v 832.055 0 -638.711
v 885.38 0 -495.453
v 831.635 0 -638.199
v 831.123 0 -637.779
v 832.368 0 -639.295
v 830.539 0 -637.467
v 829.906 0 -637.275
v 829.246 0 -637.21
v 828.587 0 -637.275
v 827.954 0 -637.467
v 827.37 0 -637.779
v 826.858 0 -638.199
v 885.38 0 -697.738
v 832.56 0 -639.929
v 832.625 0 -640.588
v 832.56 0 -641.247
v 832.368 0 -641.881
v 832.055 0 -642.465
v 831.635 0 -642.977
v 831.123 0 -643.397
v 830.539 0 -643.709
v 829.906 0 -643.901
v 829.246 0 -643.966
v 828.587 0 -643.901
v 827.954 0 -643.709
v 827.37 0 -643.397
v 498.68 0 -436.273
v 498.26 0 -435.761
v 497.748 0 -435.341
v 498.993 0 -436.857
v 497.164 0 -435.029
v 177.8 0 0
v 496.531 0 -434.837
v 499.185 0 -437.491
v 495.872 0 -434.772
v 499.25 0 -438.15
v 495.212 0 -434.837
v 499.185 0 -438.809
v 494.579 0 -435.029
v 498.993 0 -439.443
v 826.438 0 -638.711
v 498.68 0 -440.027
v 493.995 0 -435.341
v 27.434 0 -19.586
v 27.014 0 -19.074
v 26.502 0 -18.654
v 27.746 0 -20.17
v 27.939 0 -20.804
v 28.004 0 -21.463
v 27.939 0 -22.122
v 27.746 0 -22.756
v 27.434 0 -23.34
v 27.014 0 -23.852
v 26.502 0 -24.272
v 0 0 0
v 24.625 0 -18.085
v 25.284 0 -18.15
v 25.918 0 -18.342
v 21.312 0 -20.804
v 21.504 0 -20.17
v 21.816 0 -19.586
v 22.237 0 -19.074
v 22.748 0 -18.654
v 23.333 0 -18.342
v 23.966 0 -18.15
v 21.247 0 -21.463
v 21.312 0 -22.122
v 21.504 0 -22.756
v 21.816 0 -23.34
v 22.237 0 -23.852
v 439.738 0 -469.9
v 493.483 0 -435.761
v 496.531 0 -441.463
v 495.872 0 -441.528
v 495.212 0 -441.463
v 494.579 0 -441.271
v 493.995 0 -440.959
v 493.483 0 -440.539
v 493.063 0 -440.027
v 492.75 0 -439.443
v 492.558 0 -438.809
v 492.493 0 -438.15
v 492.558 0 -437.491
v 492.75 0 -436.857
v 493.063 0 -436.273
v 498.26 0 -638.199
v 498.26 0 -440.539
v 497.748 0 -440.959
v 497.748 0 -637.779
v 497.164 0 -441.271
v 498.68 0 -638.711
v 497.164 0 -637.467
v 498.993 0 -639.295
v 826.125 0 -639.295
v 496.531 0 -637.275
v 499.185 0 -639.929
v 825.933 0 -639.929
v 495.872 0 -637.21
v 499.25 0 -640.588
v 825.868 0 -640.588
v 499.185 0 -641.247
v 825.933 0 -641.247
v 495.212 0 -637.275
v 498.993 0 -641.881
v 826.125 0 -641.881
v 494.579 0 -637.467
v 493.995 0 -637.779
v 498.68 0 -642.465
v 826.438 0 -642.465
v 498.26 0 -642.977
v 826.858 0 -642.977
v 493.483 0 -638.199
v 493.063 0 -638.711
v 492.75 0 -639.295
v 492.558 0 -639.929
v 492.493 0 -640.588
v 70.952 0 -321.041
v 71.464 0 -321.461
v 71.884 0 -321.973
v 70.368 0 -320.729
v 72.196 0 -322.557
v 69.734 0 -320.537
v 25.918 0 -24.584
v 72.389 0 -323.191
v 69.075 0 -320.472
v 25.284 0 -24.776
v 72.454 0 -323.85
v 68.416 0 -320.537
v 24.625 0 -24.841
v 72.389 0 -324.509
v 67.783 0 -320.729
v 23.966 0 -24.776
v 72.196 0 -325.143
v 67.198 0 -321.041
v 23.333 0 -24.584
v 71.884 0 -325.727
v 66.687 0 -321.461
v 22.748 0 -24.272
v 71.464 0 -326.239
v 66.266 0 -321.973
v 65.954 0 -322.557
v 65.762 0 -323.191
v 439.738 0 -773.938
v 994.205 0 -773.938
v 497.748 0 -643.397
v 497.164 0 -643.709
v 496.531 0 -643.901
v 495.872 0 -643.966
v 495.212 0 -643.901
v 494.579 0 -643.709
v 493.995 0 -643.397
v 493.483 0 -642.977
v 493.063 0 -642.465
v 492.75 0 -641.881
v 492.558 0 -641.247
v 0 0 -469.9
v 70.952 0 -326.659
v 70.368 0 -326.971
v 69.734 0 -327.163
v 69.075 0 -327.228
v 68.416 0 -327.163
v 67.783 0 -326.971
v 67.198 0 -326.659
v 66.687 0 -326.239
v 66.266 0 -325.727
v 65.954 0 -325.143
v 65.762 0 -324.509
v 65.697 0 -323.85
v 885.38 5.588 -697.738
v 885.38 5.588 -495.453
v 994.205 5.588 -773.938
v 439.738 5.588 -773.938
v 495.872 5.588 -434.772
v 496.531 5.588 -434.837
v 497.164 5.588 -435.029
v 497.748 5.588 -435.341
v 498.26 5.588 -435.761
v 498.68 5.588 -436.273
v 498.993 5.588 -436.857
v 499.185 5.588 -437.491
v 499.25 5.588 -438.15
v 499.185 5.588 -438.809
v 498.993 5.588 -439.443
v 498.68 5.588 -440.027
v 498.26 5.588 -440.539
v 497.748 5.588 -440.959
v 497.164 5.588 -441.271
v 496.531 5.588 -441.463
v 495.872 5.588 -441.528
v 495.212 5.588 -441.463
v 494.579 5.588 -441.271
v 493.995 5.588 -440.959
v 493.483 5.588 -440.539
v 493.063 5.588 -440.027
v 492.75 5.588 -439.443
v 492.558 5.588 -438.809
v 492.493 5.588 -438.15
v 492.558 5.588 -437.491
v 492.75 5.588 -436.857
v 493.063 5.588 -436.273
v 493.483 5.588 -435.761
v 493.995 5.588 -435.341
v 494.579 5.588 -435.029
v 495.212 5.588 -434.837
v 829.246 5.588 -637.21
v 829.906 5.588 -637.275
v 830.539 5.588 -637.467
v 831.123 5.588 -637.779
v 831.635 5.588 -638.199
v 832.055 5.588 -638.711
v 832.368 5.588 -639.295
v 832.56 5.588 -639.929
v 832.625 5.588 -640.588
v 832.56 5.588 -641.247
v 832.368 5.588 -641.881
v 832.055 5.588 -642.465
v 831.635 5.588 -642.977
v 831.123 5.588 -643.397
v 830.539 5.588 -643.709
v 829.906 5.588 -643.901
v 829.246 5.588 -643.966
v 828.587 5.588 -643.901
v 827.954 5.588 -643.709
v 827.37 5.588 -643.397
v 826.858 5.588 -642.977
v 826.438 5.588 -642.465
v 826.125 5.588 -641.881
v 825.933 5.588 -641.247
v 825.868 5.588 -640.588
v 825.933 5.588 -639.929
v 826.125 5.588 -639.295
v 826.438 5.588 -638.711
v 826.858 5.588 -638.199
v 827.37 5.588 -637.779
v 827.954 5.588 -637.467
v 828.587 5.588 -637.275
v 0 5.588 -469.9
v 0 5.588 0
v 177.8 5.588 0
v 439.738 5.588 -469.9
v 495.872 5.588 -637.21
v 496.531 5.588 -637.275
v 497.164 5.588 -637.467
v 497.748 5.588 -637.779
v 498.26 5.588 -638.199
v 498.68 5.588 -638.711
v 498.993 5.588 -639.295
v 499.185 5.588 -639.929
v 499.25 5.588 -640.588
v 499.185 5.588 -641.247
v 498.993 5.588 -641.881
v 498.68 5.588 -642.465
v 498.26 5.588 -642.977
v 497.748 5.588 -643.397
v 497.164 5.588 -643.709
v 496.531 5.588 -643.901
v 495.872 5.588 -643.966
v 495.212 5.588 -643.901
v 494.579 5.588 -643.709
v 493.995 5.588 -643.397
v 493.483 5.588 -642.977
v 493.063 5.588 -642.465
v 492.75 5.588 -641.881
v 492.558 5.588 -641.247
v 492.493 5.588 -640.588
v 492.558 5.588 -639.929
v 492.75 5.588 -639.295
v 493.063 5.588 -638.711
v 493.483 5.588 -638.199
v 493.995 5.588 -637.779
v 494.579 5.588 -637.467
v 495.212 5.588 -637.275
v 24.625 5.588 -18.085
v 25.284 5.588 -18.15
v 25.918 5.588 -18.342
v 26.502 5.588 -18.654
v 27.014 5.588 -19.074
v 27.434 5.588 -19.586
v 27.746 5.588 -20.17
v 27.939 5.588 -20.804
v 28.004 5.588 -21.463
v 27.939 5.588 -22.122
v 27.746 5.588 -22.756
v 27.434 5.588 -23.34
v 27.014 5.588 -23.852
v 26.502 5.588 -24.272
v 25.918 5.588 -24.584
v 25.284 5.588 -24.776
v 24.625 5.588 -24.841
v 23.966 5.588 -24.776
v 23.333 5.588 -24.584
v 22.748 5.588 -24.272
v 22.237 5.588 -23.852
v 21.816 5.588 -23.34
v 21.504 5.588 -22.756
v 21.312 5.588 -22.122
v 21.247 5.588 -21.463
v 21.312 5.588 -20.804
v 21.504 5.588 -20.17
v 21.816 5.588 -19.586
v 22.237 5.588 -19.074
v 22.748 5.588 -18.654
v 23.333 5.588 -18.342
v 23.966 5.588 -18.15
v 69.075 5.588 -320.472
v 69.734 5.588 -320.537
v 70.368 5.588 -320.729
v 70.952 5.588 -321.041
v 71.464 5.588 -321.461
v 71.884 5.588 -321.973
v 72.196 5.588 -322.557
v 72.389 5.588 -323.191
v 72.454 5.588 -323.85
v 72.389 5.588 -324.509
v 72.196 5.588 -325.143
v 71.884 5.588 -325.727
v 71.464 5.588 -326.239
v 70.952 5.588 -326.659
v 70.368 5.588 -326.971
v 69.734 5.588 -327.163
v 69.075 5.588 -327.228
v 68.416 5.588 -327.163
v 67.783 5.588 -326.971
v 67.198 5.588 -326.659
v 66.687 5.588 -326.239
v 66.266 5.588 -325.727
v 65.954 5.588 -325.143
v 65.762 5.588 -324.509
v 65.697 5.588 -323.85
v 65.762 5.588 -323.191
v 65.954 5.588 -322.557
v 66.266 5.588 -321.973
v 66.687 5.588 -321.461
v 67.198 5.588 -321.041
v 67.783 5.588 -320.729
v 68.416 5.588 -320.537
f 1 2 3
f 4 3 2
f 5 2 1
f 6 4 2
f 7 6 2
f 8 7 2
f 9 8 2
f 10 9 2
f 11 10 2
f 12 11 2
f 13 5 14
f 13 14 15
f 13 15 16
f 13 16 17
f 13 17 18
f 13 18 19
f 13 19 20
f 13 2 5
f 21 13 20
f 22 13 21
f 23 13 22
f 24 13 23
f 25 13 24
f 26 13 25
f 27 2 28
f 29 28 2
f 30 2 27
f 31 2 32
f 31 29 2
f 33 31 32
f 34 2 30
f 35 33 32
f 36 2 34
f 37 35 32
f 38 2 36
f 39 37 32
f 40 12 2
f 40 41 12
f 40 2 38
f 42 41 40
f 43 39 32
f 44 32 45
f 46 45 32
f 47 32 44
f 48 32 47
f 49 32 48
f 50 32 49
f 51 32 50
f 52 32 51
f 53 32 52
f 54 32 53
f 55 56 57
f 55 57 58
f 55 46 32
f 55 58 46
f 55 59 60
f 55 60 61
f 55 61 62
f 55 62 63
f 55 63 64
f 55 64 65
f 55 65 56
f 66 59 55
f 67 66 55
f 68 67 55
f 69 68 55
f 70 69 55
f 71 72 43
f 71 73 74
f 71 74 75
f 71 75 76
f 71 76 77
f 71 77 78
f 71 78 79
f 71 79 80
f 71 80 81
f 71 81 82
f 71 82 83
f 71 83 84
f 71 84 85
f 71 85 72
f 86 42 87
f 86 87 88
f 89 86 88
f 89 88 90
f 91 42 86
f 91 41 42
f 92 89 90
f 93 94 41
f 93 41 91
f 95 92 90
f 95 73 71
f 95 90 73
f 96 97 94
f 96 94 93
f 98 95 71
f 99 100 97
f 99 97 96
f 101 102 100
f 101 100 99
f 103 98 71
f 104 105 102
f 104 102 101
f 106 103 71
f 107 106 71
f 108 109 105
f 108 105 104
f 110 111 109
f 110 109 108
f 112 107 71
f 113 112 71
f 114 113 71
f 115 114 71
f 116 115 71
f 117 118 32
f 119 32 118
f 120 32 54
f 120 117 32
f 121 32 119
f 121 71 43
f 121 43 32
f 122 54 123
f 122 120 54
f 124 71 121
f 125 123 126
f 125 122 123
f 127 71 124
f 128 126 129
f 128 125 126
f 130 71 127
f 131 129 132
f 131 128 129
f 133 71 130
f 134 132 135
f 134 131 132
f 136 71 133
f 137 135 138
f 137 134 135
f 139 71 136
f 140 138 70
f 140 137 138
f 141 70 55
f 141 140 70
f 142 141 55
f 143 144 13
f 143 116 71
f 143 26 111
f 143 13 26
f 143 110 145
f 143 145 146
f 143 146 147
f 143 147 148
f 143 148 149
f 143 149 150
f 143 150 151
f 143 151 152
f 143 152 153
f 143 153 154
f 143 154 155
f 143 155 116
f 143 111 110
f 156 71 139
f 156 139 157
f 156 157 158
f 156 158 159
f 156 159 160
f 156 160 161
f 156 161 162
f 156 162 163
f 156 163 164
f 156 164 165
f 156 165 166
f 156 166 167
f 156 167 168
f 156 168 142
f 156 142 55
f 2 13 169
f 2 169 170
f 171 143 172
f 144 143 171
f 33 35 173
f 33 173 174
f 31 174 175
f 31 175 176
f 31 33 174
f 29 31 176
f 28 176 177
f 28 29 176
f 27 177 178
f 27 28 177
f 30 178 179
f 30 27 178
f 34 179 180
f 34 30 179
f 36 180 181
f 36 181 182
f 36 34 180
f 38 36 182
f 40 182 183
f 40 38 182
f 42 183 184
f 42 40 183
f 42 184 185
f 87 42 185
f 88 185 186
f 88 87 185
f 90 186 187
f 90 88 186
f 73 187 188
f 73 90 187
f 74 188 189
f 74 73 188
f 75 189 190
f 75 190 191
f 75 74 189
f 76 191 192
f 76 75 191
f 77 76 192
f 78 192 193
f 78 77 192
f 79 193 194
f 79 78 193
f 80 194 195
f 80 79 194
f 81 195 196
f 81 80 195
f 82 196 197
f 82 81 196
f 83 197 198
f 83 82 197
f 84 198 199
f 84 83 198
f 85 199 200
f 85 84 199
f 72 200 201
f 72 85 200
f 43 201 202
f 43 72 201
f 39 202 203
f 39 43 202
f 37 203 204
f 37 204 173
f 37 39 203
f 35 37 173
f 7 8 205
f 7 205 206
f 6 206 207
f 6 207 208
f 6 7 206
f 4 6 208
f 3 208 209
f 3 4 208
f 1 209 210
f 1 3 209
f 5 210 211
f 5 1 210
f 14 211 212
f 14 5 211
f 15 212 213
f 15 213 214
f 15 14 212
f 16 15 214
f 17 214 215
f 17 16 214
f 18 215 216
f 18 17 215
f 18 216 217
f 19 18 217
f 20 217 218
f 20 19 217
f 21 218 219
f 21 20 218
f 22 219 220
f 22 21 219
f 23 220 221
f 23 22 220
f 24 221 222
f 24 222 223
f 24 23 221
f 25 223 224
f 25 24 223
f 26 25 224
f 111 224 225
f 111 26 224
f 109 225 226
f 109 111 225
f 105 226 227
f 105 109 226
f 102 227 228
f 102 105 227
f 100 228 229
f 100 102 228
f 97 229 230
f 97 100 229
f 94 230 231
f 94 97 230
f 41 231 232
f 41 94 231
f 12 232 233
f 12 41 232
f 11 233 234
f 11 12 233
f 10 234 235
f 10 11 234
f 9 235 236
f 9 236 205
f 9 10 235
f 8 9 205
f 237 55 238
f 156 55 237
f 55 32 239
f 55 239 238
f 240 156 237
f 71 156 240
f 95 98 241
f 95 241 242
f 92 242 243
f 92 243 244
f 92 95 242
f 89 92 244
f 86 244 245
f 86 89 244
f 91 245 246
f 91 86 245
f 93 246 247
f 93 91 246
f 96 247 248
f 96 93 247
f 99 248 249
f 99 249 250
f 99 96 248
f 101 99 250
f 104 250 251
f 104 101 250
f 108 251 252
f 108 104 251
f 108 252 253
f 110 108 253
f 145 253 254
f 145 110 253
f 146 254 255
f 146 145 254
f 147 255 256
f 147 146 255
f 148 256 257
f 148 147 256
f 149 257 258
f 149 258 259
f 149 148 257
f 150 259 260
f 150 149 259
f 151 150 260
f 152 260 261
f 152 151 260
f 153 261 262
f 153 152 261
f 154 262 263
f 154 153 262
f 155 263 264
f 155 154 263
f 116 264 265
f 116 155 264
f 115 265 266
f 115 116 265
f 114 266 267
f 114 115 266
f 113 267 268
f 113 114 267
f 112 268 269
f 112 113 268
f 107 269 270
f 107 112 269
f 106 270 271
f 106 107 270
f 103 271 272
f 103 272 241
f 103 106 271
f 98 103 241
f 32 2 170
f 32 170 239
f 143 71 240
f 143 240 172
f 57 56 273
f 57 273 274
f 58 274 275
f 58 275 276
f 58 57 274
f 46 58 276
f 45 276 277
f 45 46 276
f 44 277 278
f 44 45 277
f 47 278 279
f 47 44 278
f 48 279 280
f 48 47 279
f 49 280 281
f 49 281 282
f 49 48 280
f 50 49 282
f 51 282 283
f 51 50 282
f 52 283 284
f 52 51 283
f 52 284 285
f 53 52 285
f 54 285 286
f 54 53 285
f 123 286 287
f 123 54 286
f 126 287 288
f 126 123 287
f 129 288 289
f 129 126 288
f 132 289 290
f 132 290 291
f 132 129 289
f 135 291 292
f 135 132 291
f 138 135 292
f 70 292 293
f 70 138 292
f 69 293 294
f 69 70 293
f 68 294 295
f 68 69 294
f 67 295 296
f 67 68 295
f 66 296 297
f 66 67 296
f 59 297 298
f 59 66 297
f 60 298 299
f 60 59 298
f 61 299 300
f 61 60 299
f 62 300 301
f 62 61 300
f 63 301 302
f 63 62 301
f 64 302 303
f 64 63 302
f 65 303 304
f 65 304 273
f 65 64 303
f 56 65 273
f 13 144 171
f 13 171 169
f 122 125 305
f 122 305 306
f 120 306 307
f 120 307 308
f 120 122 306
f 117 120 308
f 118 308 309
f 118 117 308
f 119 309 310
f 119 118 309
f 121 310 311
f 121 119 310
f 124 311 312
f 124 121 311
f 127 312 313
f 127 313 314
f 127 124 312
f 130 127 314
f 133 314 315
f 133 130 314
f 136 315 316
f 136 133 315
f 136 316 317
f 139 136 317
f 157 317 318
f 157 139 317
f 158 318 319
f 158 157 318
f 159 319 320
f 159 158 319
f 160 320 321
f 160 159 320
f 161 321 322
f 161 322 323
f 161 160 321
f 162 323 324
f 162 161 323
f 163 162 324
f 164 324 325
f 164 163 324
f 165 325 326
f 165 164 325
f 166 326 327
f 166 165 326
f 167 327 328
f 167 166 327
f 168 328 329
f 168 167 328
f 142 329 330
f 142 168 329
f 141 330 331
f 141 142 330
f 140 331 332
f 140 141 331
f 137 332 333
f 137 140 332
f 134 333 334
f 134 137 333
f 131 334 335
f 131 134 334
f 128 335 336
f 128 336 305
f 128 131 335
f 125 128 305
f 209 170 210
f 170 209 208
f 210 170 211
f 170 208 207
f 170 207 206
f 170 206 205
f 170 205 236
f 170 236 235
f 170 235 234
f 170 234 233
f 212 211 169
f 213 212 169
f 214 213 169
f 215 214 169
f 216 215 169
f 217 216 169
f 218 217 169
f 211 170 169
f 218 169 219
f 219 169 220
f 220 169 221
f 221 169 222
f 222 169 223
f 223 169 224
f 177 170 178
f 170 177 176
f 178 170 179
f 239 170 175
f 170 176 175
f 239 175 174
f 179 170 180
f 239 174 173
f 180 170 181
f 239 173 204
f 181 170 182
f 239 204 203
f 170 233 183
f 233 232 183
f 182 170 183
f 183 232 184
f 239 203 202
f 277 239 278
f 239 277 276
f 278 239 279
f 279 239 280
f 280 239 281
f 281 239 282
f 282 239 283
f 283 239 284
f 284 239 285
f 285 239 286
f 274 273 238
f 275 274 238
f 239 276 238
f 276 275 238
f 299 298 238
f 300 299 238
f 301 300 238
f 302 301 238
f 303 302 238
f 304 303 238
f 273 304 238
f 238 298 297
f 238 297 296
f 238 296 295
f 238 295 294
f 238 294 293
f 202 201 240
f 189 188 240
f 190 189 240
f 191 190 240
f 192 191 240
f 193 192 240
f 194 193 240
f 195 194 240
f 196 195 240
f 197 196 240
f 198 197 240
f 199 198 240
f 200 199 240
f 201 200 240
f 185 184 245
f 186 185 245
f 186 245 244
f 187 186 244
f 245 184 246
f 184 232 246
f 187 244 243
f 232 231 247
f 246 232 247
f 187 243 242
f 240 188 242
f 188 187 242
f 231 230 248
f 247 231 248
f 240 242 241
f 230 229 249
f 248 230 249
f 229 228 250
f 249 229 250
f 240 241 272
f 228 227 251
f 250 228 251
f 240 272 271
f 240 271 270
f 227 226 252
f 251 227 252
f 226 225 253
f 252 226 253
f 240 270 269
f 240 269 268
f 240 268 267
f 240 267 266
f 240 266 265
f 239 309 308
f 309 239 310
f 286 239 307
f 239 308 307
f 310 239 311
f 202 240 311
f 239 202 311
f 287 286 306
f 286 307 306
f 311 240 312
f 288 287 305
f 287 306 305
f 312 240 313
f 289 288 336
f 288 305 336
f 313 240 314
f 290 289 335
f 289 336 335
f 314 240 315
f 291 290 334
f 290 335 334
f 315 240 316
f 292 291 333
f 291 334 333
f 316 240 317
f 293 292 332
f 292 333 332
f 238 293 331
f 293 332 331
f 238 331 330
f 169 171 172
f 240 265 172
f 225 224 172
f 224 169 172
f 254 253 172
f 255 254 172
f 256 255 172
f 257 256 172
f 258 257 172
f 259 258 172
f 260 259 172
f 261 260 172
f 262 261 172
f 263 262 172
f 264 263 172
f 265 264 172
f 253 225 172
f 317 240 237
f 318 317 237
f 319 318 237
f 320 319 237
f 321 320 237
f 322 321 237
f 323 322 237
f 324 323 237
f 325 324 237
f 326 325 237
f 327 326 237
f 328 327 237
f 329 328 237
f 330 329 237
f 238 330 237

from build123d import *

# Parameters (mm, degrees)
SKETCH1_R           = 3.3782
BOSS_EXTRUDE1_DEPTH = 5.588


with BuildPart() as part:
    # Sketch1 (on Top Plane) → Boss-Extrude1 (new body)
    with BuildSketch(Plane(origin=(0, 0, 0), x_dir=(1, 0, 0), z_dir=(0, 1, 0))):
        Polygon((0, 0), (0, 469.9), (439.7375, 469.9), (439.7375, 773.938), (994.205378114, 773.938), (885.3805, 697.738), (885.3805, 495.45319999), (177.8, 0), align=None)
        with Locations(Location((24.6253, 21.463, 0), (0, 0, 270))):
            Circle(SKETCH1_R, mode=Mode.SUBTRACT)
        with Locations(Location((69.0753, 323.85, 0), (0, 0, 270))):
            Circle(SKETCH1_R, mode=Mode.SUBTRACT)
        with Locations(Location((495.8715, 438.15, 0), (0, 0, 270))):
            Circle(SKETCH1_R, mode=Mode.SUBTRACT)
        with Locations(Location((495.8715, 640.588, 0), (0, 0, 270))):
            Circle(SKETCH1_R, mode=Mode.SUBTRACT)
        with Locations(Location((829.2465, 640.588, 0), (0, 0, 270))):
            Circle(SKETCH1_R, mode=Mode.SUBTRACT)
    extrude(amount=BOSS_EXTRUDE1_DEPTH)


solid = part.part
